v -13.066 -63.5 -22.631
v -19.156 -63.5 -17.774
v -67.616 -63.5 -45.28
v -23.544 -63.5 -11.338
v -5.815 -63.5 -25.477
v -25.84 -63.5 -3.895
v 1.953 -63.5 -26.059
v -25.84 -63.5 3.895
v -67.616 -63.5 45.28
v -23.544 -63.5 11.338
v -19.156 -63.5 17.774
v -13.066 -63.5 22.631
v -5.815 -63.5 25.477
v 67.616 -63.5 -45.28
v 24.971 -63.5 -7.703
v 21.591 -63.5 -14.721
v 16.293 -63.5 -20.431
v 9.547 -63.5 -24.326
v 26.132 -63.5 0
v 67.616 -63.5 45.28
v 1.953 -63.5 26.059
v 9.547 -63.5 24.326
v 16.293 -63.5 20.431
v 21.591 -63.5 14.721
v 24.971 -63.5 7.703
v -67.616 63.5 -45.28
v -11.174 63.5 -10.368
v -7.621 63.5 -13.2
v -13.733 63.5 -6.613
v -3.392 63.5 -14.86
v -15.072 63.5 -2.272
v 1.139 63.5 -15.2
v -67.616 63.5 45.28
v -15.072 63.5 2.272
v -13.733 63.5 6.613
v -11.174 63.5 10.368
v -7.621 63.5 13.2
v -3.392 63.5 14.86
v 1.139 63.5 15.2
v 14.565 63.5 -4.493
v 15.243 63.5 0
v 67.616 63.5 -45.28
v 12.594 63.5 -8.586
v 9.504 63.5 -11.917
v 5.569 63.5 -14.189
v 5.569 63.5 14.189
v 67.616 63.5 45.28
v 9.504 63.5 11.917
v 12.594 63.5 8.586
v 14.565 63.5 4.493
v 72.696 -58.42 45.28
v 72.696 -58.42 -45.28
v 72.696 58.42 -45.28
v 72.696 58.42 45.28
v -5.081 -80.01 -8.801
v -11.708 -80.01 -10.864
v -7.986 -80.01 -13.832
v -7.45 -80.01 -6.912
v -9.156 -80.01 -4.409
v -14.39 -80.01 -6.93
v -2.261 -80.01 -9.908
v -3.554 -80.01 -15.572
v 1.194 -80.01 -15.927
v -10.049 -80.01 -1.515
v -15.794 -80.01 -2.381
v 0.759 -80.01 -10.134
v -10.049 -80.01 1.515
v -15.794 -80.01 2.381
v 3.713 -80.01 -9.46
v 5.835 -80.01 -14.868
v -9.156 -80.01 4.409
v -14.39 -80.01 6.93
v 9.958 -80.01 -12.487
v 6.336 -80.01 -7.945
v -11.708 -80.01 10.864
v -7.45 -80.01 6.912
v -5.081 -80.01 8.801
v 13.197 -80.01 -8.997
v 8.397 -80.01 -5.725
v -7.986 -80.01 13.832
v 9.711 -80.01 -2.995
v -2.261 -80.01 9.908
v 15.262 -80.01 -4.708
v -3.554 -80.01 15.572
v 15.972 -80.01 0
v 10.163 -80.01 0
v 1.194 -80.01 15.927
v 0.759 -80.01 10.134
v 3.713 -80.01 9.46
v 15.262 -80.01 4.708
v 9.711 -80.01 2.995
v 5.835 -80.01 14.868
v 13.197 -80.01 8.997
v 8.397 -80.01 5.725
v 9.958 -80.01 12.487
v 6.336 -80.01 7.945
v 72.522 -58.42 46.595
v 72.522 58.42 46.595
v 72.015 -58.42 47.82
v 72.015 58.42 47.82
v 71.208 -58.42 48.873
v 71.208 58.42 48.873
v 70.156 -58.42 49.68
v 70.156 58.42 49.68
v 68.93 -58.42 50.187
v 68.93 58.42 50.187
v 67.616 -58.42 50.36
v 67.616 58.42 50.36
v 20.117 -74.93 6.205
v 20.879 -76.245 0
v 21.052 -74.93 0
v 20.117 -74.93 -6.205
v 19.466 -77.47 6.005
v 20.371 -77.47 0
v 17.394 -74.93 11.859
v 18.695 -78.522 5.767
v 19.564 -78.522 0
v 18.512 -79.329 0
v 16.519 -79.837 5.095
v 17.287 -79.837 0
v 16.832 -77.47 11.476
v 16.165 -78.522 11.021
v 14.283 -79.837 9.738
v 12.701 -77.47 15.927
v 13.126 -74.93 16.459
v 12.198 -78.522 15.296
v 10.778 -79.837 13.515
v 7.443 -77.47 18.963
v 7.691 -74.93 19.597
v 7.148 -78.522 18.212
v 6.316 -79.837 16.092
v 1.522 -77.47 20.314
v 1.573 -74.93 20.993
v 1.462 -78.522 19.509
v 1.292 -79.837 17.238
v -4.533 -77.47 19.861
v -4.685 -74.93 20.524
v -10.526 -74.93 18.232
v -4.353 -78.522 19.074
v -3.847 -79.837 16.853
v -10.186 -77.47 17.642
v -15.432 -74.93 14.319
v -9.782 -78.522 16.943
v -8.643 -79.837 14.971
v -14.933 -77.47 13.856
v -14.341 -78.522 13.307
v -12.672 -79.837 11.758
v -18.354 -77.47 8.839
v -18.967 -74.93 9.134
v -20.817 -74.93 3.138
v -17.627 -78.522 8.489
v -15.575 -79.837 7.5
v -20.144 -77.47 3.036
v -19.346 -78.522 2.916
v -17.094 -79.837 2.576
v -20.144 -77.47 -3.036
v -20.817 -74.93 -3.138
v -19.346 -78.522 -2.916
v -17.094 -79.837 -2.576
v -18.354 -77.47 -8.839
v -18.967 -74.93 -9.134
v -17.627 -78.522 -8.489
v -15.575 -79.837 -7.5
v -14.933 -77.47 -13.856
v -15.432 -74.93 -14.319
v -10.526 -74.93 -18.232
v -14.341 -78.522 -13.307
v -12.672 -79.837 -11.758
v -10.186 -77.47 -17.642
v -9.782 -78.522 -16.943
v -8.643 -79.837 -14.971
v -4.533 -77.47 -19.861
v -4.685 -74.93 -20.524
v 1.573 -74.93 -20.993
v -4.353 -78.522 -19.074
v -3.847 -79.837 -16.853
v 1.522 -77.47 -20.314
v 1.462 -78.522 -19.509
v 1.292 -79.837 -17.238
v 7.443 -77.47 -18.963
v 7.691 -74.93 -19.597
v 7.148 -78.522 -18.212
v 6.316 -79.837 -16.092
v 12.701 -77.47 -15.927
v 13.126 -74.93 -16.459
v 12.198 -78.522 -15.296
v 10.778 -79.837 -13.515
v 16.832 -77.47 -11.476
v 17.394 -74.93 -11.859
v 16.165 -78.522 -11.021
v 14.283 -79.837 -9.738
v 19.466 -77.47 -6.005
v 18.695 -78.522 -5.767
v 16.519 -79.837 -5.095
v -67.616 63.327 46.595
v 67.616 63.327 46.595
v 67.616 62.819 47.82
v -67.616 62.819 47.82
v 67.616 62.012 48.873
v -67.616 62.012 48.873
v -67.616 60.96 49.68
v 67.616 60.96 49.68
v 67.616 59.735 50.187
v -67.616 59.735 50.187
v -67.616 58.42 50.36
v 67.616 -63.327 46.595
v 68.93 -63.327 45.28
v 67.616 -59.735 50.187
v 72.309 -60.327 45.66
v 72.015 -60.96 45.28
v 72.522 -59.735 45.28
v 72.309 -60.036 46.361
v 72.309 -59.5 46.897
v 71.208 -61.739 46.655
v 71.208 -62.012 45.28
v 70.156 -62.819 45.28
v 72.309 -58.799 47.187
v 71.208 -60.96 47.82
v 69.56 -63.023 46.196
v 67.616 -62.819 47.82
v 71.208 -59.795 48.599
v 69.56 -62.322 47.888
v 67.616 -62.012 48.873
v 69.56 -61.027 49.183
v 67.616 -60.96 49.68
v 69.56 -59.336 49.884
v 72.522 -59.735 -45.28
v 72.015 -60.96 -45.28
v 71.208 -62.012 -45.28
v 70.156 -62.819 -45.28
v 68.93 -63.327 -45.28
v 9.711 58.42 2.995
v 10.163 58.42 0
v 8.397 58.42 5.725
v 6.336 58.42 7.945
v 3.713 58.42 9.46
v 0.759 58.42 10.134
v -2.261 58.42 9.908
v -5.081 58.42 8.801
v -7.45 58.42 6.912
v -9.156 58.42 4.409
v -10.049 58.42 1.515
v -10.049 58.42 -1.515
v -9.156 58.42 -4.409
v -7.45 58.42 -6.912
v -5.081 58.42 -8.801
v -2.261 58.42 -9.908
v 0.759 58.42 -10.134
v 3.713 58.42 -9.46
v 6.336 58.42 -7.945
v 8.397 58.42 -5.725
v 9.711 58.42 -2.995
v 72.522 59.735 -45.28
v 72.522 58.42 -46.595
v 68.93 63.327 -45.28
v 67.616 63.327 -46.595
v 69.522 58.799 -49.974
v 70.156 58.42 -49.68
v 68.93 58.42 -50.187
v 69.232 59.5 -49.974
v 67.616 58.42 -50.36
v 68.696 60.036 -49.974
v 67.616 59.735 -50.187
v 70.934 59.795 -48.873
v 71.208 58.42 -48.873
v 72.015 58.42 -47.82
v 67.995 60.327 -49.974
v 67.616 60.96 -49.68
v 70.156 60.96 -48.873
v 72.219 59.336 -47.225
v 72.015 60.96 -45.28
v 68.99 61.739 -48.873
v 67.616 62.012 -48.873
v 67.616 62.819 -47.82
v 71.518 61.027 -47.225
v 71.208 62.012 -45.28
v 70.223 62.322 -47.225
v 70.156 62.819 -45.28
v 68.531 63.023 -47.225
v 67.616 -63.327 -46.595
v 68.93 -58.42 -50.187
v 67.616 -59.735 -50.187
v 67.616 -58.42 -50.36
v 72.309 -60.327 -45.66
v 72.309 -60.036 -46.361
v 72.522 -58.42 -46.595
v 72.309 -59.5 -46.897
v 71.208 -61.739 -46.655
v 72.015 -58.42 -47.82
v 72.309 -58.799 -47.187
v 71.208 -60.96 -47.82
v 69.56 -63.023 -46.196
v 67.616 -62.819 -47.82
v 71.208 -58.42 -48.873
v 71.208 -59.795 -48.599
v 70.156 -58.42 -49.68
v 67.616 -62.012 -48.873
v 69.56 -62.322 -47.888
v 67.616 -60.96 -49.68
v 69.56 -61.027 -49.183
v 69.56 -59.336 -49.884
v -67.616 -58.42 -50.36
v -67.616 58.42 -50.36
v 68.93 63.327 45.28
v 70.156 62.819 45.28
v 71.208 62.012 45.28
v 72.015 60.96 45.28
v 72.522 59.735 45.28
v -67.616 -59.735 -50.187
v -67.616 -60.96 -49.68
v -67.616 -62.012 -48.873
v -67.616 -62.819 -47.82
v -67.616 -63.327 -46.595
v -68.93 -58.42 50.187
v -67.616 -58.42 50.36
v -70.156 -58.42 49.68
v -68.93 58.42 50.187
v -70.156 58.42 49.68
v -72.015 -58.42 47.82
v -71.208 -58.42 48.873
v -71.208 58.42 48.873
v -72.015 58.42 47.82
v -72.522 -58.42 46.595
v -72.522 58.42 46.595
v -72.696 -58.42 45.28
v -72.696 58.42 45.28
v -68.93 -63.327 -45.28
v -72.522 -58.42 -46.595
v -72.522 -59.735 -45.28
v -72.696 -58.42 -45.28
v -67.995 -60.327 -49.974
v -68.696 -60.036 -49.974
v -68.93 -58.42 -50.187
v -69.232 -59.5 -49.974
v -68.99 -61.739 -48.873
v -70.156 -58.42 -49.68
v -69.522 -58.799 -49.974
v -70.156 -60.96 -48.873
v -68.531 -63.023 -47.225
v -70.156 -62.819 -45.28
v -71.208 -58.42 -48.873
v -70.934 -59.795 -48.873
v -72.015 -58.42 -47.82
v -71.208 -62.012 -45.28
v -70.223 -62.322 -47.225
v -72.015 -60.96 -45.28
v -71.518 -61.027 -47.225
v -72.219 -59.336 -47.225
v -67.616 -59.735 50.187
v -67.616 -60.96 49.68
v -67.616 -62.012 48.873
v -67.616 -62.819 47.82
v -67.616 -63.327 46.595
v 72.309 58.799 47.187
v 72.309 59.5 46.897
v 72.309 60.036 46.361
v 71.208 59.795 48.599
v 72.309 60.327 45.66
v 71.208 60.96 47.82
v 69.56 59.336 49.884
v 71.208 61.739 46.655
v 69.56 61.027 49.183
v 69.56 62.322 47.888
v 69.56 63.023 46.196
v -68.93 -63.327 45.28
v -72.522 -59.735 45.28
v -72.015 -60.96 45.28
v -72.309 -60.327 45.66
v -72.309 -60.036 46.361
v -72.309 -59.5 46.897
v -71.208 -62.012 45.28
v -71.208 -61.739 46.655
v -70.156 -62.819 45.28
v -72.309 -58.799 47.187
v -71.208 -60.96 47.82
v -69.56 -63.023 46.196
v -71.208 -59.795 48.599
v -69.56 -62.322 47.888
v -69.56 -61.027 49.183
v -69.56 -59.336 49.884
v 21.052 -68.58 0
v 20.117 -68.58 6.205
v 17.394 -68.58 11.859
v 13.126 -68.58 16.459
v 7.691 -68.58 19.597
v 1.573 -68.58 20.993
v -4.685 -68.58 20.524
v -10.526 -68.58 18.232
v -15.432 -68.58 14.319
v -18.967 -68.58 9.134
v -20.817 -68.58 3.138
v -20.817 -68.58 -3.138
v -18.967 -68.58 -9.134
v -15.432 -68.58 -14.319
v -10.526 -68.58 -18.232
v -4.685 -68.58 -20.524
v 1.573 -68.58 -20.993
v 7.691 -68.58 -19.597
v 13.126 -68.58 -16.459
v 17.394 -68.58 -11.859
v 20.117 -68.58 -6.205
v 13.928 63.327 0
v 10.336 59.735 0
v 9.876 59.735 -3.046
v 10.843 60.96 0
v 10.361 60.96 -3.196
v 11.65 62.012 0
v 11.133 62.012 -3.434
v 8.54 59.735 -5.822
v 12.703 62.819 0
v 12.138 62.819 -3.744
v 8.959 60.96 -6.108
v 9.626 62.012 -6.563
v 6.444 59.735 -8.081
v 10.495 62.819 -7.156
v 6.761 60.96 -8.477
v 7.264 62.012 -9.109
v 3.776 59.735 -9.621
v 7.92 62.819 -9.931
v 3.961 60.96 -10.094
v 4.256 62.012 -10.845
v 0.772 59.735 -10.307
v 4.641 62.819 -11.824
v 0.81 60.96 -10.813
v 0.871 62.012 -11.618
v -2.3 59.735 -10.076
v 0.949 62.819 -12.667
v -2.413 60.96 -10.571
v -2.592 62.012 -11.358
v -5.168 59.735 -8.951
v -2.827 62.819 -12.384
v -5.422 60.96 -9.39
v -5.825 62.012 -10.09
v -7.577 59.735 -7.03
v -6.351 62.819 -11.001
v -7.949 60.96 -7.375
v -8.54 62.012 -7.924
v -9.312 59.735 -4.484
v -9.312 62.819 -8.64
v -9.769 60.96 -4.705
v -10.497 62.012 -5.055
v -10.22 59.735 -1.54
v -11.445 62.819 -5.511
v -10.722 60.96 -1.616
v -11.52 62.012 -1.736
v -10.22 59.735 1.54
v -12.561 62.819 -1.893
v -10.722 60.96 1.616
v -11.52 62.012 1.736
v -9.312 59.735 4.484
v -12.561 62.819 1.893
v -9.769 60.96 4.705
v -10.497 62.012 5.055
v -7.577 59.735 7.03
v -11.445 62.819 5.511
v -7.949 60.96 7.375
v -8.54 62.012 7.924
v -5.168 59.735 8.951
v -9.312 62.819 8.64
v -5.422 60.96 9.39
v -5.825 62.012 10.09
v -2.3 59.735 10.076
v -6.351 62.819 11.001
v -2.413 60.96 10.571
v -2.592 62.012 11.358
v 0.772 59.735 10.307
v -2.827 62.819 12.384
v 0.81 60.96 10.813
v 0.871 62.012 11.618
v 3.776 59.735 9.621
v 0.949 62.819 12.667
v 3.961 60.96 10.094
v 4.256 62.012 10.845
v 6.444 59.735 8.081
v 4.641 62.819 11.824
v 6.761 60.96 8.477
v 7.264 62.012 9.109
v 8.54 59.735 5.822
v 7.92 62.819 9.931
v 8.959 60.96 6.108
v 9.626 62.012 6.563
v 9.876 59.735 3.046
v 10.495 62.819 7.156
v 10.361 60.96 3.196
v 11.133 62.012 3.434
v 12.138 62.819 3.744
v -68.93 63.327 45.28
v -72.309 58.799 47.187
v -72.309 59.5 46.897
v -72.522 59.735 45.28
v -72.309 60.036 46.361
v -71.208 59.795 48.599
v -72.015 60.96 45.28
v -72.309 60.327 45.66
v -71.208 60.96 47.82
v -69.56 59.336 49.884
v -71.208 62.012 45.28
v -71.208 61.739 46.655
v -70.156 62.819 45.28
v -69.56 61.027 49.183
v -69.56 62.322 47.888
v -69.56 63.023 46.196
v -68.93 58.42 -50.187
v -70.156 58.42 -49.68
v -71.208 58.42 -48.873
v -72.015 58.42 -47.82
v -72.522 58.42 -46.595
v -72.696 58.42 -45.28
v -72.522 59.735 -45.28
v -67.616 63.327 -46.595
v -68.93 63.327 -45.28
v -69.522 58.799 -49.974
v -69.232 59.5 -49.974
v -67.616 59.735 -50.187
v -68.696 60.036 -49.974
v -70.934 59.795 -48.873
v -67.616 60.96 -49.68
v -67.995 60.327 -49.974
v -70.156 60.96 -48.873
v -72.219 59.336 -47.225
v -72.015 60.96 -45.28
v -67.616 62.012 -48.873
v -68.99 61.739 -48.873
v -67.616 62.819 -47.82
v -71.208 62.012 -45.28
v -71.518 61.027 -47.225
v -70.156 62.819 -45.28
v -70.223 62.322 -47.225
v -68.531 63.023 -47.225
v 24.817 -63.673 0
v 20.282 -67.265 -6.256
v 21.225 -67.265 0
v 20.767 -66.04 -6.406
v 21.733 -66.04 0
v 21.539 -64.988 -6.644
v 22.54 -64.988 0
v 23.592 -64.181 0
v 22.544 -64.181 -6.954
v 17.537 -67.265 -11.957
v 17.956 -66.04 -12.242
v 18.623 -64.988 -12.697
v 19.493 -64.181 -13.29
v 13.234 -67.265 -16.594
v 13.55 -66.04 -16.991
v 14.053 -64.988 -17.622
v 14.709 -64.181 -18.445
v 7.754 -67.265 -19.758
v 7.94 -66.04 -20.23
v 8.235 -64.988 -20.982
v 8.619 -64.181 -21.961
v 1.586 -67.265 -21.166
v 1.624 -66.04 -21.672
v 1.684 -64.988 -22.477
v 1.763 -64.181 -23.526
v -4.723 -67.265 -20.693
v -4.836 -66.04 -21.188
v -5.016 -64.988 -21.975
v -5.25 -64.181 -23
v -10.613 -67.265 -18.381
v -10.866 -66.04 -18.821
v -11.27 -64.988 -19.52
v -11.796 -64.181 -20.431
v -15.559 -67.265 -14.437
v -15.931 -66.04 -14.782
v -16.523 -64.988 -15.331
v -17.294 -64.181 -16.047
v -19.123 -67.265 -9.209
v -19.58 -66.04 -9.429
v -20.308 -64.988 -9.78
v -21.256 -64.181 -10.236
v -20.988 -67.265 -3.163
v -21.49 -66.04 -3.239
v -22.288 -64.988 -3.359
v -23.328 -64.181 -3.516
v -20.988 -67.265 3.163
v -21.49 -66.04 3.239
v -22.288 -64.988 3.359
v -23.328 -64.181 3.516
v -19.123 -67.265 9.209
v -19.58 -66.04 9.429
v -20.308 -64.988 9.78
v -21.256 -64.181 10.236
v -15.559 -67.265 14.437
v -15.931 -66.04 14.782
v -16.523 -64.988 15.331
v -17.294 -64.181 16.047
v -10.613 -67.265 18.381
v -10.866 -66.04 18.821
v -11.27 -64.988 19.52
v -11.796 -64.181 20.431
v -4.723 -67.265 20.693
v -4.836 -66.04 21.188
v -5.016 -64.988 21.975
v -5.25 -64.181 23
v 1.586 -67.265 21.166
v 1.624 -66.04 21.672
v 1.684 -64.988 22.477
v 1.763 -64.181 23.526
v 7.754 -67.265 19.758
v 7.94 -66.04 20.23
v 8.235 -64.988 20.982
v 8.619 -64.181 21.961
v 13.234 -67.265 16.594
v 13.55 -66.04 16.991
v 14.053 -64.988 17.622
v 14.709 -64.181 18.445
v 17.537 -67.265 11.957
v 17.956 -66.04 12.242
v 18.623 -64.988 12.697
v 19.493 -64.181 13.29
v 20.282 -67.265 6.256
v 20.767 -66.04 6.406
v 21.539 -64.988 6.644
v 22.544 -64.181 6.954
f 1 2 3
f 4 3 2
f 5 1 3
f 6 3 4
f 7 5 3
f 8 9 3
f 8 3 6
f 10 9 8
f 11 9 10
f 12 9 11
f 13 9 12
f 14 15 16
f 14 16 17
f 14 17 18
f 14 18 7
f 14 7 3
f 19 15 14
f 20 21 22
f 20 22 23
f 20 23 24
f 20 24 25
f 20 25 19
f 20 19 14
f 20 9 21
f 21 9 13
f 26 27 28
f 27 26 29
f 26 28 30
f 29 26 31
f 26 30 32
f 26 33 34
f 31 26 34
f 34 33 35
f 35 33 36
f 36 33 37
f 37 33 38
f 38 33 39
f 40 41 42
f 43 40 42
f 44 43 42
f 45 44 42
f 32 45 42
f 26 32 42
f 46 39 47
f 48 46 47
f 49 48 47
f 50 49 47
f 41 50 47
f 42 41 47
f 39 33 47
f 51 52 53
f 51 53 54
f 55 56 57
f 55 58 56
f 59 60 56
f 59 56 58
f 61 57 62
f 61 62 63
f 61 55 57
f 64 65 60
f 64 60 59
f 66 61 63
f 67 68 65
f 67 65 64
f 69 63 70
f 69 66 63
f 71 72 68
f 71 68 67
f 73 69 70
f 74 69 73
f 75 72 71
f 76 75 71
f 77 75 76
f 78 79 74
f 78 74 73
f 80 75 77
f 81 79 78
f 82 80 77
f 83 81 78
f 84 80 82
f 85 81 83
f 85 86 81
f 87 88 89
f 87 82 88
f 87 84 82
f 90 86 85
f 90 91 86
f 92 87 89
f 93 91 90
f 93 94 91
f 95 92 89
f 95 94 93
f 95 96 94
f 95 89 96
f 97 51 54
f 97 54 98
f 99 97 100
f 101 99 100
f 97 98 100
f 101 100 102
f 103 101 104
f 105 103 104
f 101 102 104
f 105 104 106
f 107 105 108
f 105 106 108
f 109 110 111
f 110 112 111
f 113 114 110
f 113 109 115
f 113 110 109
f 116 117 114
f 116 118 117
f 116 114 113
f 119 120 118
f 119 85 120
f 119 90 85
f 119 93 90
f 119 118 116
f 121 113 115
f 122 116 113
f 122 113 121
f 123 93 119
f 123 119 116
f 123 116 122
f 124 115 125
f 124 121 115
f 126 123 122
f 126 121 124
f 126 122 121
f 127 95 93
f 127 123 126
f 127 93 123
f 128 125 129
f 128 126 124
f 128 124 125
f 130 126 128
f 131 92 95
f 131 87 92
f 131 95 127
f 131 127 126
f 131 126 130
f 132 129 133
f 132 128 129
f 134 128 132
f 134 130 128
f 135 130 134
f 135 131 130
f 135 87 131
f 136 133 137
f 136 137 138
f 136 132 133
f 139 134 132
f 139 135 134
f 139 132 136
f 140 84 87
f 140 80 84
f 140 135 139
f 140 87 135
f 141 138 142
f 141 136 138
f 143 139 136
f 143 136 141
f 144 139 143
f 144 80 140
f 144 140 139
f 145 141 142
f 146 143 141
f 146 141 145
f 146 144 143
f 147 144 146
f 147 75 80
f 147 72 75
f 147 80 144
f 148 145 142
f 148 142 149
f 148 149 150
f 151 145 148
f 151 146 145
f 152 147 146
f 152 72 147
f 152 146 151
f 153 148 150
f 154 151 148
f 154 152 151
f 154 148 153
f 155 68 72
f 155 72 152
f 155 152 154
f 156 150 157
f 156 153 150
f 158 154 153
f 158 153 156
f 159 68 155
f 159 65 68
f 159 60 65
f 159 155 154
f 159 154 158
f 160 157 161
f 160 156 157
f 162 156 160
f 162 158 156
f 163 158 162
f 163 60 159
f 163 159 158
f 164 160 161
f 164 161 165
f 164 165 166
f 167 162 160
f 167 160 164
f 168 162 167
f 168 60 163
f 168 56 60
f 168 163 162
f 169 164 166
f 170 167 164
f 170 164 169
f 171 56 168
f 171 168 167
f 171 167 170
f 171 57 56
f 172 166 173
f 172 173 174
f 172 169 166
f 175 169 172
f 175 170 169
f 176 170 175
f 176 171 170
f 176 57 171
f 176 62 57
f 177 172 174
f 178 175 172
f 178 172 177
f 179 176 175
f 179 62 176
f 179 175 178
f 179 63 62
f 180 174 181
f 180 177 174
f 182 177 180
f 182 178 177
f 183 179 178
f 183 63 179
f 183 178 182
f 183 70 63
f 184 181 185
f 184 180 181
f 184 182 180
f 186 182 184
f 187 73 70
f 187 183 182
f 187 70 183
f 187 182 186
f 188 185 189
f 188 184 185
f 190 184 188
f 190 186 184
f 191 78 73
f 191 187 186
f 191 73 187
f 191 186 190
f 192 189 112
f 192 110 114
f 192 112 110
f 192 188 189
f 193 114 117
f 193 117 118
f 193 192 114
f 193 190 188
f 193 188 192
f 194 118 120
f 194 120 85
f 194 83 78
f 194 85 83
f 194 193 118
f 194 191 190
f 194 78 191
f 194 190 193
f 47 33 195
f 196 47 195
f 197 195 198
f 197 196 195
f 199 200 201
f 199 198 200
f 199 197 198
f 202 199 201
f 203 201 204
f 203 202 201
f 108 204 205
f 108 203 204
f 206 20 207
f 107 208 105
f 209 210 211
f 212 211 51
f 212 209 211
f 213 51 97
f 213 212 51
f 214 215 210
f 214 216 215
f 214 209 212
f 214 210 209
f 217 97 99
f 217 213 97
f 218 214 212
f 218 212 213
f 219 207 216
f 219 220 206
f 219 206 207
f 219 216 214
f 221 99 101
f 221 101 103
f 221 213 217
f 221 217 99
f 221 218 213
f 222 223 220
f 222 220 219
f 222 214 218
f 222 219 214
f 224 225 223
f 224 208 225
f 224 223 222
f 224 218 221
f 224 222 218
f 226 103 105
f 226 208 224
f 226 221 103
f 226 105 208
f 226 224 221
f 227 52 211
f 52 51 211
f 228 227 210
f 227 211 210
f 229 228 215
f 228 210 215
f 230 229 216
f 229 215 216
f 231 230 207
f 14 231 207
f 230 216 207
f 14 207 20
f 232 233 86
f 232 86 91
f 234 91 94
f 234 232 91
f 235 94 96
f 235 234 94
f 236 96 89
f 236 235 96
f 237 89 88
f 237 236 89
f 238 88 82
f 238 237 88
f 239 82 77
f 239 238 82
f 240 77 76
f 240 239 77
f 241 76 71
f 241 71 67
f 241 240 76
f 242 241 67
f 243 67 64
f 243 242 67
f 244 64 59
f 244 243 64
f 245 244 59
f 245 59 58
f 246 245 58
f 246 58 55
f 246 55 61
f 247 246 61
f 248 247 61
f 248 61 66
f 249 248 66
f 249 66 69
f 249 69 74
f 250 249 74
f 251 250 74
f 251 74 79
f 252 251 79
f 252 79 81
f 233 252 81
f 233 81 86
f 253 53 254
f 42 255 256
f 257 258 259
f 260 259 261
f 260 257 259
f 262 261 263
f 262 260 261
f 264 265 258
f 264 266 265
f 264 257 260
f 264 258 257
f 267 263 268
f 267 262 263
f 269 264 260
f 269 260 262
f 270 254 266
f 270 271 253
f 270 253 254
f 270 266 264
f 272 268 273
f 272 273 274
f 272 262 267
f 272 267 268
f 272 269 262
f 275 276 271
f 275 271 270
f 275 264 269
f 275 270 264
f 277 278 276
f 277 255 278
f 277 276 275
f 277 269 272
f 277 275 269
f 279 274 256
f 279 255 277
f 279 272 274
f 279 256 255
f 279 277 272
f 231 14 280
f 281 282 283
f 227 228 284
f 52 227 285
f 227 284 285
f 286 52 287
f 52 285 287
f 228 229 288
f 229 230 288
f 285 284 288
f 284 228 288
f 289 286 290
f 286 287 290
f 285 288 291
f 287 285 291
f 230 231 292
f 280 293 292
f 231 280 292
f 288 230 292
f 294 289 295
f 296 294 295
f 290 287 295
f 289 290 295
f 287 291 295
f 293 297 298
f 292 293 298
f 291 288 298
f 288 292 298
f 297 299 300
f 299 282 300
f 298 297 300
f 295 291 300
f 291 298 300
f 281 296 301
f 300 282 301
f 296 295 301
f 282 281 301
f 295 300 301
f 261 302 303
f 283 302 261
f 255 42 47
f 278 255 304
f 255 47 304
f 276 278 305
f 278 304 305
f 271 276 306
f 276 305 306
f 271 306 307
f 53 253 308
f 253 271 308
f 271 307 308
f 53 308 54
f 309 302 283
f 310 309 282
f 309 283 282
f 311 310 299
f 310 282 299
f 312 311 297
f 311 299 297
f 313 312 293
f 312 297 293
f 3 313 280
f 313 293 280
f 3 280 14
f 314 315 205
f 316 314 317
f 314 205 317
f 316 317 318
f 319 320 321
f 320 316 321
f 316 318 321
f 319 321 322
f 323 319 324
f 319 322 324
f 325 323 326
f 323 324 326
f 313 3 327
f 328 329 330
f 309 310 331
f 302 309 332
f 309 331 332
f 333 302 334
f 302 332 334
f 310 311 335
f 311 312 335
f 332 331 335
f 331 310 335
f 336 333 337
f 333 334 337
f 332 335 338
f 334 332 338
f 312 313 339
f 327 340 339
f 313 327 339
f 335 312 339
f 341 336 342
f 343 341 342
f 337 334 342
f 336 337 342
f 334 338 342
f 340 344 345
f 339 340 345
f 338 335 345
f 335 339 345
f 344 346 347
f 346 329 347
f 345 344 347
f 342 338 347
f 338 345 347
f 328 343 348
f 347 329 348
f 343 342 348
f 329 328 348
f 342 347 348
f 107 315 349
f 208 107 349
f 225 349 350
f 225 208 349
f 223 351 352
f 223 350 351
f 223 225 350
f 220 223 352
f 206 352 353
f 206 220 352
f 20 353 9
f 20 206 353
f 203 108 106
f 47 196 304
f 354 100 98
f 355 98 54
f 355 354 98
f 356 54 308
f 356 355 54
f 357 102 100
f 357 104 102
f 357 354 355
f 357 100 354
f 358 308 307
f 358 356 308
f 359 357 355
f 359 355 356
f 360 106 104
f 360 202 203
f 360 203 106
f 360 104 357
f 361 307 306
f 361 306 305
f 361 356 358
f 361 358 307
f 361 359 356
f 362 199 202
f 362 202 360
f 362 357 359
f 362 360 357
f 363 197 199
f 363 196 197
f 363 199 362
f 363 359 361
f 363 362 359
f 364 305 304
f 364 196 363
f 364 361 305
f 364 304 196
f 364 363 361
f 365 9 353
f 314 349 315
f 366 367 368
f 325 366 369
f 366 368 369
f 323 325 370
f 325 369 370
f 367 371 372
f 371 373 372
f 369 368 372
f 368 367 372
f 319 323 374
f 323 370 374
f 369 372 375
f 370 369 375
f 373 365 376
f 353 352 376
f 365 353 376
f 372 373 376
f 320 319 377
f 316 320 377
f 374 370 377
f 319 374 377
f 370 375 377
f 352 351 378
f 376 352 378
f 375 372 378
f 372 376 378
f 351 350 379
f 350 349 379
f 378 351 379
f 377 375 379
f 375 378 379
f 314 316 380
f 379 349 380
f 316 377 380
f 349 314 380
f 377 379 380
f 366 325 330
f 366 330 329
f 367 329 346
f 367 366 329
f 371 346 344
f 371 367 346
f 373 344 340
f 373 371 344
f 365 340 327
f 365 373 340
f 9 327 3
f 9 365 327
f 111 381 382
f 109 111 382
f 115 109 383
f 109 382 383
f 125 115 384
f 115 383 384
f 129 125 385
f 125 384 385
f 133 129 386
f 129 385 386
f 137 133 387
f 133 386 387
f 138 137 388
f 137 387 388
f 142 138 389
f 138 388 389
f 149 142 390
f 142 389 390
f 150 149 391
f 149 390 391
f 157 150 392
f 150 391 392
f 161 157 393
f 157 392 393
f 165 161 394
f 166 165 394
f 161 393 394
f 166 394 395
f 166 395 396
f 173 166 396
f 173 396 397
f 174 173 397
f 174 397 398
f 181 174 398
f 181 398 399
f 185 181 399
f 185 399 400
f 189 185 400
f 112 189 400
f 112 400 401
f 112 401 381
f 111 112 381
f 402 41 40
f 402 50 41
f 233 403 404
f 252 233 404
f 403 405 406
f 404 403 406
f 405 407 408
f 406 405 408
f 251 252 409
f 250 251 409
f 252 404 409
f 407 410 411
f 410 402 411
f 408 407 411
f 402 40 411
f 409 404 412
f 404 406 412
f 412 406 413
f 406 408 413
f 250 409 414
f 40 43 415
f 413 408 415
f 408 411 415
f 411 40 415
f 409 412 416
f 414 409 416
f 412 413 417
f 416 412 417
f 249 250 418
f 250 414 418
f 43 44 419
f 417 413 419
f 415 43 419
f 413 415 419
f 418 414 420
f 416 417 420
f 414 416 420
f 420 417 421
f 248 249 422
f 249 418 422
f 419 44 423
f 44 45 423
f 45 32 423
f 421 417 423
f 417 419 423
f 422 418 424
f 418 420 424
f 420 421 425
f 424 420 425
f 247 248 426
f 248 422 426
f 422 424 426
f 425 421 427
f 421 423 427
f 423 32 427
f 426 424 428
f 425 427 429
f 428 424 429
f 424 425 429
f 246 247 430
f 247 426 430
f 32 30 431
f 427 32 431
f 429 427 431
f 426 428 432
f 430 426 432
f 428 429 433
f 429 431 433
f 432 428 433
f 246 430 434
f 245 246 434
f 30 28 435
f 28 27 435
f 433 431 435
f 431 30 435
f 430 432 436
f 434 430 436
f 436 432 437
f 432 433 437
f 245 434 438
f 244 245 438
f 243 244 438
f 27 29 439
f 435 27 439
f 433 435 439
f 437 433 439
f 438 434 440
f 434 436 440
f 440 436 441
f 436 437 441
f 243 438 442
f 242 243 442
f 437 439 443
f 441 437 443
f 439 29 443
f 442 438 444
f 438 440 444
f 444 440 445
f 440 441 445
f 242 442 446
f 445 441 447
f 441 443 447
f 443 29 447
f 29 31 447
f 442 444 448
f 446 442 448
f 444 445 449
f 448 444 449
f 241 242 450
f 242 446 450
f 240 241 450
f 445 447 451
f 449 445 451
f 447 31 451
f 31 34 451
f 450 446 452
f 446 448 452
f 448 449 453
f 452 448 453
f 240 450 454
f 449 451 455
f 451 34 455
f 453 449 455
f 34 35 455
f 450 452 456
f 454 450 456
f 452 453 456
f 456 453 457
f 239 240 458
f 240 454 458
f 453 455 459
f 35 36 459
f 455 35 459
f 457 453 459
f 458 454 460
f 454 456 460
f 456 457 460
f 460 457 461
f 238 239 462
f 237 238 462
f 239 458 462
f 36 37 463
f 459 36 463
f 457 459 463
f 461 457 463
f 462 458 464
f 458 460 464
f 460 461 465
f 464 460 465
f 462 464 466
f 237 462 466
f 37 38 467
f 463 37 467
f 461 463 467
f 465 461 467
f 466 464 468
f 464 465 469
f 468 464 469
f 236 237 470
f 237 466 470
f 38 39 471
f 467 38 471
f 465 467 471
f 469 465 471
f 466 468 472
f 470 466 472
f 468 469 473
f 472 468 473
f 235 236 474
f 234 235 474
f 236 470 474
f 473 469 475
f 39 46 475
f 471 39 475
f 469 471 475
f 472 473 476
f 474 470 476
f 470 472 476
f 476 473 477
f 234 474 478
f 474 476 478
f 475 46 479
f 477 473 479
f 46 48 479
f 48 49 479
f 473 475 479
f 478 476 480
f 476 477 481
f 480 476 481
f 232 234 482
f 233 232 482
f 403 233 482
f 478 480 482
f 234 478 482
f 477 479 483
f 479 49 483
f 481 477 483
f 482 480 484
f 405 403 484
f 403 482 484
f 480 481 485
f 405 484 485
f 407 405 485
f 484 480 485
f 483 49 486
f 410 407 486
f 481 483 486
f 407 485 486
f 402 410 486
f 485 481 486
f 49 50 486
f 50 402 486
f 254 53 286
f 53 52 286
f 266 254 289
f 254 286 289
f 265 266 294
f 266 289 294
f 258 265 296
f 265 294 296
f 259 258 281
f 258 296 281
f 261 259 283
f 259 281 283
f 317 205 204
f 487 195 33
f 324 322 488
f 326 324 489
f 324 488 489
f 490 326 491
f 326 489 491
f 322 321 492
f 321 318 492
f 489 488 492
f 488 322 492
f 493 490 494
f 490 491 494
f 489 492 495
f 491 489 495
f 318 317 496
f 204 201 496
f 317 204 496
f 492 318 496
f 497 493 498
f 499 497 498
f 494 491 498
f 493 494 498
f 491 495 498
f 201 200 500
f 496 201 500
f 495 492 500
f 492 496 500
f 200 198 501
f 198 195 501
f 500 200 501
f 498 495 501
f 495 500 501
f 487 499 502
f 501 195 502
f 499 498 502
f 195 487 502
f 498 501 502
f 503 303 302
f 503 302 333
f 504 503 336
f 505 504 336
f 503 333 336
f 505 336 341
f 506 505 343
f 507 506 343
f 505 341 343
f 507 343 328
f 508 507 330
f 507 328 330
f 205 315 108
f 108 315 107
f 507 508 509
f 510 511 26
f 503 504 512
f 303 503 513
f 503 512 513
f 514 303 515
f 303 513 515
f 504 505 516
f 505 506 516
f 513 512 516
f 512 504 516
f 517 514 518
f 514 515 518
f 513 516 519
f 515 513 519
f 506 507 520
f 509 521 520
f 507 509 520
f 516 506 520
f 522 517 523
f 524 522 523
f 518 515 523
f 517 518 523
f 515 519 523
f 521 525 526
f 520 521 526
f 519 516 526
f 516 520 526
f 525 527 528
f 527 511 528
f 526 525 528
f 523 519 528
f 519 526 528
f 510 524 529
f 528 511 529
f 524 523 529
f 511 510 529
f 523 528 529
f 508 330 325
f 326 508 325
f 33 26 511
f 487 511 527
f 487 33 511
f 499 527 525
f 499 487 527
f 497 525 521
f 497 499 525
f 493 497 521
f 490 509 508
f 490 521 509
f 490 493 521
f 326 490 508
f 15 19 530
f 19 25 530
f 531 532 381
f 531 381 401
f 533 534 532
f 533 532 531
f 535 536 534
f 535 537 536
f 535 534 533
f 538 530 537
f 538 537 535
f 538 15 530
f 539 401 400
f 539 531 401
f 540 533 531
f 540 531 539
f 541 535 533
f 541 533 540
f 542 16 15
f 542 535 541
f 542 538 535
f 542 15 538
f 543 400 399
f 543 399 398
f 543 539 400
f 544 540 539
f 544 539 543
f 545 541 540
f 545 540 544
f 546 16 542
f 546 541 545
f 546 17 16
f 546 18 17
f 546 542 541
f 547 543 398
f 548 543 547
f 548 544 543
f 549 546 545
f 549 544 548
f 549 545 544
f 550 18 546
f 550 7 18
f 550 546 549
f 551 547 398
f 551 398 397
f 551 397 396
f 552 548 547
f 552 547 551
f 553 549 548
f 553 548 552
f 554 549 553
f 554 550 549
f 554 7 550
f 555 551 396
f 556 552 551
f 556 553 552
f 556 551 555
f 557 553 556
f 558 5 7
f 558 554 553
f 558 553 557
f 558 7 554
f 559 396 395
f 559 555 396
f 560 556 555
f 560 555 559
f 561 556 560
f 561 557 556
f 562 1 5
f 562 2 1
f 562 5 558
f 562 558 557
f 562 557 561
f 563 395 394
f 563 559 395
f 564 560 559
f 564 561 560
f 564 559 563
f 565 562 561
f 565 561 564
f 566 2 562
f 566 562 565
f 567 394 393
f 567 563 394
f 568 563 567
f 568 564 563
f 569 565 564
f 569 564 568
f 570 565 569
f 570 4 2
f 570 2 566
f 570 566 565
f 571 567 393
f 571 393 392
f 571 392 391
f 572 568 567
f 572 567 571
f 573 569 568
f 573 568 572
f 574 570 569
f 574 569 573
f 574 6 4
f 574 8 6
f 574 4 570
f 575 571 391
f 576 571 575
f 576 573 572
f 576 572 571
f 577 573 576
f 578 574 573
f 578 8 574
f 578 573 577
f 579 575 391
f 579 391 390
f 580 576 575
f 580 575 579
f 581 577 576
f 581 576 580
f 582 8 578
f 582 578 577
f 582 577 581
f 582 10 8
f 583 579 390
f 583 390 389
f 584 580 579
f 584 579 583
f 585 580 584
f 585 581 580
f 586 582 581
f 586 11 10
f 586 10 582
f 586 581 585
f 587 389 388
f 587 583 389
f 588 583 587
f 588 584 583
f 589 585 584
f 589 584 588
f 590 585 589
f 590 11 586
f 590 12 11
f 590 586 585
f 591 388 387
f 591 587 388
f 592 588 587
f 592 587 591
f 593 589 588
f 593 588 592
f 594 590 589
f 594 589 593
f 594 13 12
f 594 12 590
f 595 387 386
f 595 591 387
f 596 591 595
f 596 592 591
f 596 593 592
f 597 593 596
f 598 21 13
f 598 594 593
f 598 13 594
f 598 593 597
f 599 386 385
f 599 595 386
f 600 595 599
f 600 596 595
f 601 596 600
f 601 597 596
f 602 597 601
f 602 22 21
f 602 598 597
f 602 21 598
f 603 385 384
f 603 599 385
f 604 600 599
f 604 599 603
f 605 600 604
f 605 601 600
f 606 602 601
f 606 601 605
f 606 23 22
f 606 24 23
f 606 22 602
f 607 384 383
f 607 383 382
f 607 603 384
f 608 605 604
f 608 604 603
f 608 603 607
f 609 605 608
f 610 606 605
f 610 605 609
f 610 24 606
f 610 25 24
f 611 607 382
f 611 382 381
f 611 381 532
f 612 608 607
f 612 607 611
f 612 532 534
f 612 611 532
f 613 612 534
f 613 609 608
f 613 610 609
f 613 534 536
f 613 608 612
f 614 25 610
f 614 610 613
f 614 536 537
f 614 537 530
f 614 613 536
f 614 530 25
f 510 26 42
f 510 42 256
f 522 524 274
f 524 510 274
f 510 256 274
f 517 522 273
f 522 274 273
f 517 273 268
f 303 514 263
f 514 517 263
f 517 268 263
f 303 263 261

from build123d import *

# Parameters (mm, degrees)
F0_W     = 145.3911811113
F0_H     = 100.7209792733
F2_DEPTH = 63.5
F1_R     = 21.0519907021
F1_R_2   = 10.1625017611
F3_DEPTH = 80.01
F4_DEPTH = 127
F5_R     = 5.08


with BuildPart() as f2:
    # F0 (on Front) → F2 (new body, symmetric)
    with BuildSketch(Plane.XZ):
        Rectangle(F0_W, F0_H)
    extrude(amount=F2_DEPTH, both=True)

    # F1 (on face) → F3 (join)
    with BuildSketch(Plane.XZ):
        Circle(F1_R)
        Circle(F1_R_2, mode=Mode.SUBTRACT)
    extrude(amount=F3_DEPTH)

    # F4 (cut): a face of the model
    f4_faces = [f2.faces().sort_by_distance(p)[0] for p in [
        (0, -63.5, 0),
    ]]
    extrude(f4_faces, amount=-F4_DEPTH, mode=Mode.SUBTRACT)

    # F5
    f5_edges = [f2.edges().sort_by_distance(p)[0] for p in [
        (0, -63.5, 50.36049),
        (-72.695591, -63.5, 0),
        (0, -63.5, -50.36049),
        (72.695591, -63.5, 0),
        (-21.051991, -63.5, 0),
        (0, 63.5, 50.36049),
        (-72.695591, 0, 50.36049),
        (72.695591, 0, 50.36049),
        (-72.695591, 63.5, 0),
        (-72.695591, 0, -50.36049),
        (72.695591, 63.5, 0),
        (72.695591, 0, -50.36049),
        (-21.051991, -80.01, 0),
        (0, 63.5, -50.36049),
        (-10.162502, 63.5, 0),
    ]]
    fillet(f5_edges, radius=F5_R)


solid = f2.part
